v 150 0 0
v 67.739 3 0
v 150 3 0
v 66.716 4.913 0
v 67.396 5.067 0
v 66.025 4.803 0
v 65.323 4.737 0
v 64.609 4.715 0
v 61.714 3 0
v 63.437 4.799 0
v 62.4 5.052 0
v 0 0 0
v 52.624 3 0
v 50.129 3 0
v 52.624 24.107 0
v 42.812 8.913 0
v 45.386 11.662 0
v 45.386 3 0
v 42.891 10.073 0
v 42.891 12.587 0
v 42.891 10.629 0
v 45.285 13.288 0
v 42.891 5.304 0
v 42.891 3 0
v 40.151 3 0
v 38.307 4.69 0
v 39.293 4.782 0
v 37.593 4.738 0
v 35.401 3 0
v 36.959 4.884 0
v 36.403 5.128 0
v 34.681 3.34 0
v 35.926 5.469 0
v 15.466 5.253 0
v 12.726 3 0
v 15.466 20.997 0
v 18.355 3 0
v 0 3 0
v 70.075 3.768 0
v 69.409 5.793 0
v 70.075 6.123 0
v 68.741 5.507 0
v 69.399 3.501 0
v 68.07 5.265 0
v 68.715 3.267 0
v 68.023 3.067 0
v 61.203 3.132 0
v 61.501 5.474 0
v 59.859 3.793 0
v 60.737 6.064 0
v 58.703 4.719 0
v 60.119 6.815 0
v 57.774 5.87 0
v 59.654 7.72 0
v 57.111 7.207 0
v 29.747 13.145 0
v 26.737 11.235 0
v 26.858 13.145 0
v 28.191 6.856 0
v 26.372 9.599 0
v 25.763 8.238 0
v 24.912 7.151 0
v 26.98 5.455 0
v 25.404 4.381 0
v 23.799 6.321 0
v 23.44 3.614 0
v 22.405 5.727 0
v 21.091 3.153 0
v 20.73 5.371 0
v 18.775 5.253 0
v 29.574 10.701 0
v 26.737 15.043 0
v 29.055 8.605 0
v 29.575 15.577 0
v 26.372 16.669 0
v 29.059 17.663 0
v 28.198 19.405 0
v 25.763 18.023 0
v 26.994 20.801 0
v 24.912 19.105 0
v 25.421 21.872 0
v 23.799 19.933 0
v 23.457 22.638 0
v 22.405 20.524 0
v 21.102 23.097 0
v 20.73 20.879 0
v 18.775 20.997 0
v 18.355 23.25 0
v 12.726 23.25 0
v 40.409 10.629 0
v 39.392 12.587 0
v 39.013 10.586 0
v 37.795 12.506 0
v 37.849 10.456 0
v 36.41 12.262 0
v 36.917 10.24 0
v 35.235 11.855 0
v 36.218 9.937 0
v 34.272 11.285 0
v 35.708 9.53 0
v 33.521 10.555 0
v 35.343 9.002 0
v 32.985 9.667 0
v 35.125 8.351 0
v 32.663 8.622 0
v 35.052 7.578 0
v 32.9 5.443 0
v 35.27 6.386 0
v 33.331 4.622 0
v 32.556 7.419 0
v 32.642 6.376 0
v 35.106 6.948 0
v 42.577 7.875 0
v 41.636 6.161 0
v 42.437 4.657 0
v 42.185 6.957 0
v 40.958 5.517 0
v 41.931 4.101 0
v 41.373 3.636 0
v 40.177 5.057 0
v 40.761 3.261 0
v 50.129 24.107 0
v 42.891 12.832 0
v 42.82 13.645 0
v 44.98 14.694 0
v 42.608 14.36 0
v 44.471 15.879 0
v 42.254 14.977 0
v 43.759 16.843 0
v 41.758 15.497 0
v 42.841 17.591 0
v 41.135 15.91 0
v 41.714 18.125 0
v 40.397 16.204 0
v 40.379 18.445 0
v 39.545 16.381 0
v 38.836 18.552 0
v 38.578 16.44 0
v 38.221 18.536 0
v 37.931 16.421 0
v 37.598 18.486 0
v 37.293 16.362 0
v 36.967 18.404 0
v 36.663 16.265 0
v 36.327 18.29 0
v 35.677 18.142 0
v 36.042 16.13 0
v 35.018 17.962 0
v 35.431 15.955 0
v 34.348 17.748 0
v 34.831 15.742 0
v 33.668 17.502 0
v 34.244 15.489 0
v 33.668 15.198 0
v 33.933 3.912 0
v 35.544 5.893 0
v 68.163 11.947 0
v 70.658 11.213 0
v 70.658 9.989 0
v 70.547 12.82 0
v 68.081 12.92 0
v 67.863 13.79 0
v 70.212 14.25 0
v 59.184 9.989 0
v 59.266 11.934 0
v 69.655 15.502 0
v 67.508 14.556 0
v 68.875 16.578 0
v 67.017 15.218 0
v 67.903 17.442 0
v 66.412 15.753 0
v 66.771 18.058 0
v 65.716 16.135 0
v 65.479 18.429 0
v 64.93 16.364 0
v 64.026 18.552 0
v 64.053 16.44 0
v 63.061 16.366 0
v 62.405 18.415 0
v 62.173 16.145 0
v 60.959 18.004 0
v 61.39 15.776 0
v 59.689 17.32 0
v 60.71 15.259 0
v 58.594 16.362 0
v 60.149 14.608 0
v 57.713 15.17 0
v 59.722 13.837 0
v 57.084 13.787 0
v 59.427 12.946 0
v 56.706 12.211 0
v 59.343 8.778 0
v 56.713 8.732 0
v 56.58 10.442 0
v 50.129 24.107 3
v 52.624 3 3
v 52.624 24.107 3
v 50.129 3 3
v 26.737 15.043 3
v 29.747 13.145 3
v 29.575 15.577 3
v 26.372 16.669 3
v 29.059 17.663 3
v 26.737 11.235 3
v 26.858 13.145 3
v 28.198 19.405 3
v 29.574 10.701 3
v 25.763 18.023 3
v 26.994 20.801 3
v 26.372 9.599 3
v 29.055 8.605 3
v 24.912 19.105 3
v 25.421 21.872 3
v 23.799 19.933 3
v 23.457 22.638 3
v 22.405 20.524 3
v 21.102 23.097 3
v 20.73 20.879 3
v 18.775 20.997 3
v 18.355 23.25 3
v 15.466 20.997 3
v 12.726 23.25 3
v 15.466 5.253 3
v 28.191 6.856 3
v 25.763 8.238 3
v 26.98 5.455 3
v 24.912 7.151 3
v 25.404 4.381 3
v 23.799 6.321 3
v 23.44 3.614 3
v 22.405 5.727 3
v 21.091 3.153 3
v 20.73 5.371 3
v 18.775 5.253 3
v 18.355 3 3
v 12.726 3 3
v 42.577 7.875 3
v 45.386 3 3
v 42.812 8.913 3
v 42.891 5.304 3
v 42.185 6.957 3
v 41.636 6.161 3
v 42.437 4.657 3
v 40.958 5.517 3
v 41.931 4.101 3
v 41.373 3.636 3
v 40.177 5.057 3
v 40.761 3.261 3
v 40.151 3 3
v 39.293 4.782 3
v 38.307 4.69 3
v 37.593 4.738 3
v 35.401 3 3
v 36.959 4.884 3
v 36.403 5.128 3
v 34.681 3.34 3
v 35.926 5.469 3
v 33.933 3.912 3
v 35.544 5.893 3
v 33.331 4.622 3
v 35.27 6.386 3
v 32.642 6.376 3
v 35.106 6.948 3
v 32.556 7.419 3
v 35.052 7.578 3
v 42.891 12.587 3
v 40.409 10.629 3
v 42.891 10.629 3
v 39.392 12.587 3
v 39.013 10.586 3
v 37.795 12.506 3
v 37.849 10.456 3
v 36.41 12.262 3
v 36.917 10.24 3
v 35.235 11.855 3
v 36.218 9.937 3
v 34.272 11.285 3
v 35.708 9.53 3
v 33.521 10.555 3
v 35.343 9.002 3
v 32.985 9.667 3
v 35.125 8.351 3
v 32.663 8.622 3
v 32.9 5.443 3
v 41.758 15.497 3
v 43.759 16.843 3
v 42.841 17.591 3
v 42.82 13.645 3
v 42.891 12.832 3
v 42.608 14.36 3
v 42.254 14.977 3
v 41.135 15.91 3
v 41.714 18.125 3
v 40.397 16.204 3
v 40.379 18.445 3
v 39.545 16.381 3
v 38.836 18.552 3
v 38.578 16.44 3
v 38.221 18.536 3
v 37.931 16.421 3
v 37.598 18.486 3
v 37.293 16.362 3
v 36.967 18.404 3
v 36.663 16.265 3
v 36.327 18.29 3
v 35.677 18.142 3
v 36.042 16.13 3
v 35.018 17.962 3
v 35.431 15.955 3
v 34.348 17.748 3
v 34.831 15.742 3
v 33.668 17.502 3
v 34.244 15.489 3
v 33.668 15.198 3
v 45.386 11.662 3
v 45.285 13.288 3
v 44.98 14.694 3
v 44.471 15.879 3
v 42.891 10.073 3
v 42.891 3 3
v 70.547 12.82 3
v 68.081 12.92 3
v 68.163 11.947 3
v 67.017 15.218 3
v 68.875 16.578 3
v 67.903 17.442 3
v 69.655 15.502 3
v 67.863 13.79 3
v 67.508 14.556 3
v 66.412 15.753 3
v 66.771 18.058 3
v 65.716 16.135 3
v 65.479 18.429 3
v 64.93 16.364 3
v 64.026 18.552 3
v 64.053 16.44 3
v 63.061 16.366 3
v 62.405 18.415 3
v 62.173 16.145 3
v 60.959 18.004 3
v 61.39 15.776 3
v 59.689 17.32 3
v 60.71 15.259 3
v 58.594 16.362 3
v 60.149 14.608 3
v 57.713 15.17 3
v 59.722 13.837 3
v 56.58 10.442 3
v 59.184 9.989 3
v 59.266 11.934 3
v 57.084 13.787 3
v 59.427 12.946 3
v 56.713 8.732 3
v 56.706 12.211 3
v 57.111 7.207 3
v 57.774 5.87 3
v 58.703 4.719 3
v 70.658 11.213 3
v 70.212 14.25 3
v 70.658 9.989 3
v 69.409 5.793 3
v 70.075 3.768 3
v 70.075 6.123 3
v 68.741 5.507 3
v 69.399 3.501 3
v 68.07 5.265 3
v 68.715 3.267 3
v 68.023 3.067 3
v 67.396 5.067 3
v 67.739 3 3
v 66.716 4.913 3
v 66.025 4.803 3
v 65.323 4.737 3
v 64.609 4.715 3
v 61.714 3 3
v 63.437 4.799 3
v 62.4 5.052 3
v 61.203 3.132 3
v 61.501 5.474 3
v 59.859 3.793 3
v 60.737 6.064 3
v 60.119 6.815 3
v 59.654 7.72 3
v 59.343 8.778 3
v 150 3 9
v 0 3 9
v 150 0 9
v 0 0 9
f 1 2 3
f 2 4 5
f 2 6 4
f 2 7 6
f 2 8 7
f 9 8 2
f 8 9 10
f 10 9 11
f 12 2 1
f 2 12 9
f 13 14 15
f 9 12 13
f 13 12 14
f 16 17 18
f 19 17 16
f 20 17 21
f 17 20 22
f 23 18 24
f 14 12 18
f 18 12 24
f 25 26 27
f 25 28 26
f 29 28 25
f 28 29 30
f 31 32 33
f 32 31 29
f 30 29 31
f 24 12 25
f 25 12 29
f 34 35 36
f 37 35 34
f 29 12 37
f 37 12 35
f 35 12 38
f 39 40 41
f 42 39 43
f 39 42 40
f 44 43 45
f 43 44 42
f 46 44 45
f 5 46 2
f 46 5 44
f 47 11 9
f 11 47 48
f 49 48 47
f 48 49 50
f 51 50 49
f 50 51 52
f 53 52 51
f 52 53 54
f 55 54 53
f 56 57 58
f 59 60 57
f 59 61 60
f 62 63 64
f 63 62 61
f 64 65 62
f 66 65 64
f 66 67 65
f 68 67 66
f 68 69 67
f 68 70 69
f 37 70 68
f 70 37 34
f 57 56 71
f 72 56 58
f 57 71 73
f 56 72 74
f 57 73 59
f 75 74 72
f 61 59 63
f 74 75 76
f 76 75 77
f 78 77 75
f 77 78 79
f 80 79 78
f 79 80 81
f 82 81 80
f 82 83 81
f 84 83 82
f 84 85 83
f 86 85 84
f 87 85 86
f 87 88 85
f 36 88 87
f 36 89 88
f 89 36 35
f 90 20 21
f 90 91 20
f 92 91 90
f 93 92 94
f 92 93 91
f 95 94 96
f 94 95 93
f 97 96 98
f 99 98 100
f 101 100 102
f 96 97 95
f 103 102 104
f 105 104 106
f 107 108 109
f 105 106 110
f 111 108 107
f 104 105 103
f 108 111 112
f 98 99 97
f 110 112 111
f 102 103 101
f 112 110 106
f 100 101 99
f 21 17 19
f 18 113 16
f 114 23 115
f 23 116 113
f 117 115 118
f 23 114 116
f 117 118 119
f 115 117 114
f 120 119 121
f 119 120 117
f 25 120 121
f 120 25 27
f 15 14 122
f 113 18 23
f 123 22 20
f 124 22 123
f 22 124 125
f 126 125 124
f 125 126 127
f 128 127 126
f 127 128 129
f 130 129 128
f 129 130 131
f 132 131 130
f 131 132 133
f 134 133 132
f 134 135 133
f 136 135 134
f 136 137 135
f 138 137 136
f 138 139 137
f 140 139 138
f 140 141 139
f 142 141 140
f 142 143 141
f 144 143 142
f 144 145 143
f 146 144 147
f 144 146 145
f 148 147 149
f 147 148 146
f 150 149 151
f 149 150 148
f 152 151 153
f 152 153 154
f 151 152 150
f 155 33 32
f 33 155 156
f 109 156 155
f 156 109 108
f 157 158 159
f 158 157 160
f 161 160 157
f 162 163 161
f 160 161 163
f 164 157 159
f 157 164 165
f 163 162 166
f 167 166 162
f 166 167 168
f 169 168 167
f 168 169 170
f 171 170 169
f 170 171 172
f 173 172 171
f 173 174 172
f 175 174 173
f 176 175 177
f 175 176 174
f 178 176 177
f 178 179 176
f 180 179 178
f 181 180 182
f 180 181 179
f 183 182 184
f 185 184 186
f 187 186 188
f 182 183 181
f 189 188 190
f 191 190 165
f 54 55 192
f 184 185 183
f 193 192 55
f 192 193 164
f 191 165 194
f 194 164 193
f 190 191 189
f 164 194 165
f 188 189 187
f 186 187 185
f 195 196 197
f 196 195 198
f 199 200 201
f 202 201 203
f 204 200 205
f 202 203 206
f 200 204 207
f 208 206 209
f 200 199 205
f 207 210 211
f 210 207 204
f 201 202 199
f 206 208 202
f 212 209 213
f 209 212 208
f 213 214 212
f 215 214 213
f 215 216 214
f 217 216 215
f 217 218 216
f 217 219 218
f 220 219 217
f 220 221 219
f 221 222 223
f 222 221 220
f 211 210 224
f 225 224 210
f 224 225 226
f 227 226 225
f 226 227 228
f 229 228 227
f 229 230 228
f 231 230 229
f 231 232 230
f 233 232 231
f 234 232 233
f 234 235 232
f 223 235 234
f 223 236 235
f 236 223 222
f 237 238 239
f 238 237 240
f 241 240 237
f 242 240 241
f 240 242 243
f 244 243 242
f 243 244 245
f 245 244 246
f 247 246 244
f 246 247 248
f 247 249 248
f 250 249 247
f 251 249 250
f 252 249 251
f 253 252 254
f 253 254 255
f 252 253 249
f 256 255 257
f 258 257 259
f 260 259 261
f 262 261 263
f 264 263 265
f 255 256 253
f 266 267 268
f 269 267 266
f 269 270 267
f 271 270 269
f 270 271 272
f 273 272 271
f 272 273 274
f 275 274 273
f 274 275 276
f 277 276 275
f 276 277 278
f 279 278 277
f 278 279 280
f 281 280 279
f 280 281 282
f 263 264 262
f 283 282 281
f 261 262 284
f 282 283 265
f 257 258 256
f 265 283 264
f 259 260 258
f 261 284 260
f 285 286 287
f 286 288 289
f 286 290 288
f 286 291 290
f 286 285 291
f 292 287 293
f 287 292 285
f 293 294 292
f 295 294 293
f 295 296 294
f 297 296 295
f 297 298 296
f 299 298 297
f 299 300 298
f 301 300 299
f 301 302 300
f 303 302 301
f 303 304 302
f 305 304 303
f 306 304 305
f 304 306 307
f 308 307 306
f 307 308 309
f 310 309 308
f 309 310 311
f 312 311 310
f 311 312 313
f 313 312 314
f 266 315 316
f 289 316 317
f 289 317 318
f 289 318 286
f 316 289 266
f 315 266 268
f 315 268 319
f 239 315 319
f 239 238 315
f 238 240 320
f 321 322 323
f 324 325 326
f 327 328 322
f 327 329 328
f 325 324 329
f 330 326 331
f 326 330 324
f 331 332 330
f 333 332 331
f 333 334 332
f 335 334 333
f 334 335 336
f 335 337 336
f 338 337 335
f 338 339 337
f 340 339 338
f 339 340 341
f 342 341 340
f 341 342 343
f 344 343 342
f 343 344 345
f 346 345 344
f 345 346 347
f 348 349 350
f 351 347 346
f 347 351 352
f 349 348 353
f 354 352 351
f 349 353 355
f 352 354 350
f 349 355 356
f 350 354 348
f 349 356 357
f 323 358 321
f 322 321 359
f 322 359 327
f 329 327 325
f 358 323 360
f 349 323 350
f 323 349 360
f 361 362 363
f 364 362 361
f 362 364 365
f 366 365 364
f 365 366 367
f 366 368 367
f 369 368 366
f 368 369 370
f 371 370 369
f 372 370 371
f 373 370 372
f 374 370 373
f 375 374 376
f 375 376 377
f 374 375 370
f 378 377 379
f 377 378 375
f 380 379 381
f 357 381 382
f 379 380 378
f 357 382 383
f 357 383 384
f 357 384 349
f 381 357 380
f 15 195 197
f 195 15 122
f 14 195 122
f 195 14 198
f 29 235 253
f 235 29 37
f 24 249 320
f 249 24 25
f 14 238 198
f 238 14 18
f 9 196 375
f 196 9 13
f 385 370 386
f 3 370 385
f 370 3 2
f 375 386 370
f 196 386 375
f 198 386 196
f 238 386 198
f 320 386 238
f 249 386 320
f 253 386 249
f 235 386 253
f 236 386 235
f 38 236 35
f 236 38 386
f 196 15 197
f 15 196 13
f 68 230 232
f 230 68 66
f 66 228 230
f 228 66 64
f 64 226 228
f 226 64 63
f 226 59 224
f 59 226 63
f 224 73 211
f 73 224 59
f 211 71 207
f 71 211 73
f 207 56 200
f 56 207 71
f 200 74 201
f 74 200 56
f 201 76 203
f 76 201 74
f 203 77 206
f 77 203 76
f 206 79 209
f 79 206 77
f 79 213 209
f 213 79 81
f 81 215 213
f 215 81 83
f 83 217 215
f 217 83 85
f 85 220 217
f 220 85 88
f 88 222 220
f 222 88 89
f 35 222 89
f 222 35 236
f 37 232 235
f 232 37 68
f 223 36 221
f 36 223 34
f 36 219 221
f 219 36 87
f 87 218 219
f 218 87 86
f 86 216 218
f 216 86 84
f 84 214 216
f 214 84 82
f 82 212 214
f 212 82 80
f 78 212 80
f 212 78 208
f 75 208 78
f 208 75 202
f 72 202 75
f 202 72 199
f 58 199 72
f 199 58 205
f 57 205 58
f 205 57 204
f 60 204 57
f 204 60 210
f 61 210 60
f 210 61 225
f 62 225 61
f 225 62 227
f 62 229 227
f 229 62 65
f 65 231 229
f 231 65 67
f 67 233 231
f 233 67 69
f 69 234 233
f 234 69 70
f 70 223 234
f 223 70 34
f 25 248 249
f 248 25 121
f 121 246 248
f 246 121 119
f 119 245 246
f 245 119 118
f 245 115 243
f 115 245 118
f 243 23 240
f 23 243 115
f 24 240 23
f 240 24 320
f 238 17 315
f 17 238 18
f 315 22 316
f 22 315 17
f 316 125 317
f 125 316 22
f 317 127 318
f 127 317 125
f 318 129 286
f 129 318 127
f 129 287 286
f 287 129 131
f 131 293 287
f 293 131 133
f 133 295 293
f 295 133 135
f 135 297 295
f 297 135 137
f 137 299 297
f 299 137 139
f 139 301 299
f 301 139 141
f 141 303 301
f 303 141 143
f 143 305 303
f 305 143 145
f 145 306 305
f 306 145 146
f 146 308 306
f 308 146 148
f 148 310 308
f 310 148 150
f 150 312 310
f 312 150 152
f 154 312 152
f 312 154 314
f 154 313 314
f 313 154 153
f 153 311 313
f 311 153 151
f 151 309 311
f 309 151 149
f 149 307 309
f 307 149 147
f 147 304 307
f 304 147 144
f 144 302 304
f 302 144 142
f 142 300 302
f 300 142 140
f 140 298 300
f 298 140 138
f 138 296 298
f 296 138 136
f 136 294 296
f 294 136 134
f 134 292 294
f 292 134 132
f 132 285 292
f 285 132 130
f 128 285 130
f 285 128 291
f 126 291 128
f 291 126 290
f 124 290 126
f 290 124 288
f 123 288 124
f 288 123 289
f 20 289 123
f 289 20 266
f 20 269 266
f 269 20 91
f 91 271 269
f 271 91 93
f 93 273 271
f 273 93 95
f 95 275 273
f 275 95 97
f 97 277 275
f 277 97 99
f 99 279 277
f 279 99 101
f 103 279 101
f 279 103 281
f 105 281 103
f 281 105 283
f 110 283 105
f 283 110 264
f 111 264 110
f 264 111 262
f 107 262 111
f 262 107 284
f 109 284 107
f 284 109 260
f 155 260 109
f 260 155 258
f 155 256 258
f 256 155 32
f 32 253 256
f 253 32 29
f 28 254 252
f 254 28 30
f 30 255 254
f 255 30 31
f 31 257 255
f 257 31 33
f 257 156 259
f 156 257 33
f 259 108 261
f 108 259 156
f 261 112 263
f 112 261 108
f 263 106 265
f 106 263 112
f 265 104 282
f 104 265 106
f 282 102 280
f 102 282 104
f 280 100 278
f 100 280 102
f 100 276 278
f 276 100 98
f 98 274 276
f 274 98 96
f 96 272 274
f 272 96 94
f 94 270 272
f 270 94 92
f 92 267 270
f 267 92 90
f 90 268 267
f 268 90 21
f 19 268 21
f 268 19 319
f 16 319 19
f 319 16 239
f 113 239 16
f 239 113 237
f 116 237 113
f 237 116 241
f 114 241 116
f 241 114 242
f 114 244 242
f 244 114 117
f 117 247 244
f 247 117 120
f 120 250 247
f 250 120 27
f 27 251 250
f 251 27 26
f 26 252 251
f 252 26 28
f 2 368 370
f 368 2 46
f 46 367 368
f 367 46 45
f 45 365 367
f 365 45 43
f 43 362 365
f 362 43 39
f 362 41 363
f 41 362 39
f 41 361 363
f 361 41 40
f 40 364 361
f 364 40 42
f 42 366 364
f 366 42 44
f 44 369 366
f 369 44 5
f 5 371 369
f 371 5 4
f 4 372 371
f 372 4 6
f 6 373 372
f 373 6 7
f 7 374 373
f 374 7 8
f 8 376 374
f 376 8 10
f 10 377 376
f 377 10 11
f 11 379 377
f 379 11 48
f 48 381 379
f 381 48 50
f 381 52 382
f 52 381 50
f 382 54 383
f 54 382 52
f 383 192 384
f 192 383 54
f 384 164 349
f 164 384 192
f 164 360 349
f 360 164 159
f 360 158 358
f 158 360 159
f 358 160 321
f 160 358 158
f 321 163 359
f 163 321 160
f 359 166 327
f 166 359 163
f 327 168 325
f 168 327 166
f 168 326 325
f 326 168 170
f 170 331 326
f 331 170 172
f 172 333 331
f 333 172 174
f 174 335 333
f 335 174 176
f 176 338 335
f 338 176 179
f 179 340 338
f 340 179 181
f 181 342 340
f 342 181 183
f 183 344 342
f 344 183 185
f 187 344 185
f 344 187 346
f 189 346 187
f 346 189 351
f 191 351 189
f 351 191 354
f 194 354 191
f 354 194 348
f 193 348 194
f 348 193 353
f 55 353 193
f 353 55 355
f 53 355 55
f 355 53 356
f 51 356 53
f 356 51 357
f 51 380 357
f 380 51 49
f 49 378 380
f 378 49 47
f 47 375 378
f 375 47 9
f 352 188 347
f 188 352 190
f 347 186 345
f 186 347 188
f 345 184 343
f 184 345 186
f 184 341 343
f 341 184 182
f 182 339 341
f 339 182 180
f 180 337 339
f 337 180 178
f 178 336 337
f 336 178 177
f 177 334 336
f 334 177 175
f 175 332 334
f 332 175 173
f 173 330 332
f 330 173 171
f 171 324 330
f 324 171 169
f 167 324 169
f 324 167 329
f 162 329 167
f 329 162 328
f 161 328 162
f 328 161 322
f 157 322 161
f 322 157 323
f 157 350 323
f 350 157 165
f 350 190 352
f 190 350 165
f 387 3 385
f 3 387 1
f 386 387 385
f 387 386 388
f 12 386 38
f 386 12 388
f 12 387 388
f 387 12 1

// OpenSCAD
translate([10, 3, 0])
linear_extrude(height=3)
    text("Dale", 20, "Cascadia Code Semibold");

cube([150, 3, 9]);
